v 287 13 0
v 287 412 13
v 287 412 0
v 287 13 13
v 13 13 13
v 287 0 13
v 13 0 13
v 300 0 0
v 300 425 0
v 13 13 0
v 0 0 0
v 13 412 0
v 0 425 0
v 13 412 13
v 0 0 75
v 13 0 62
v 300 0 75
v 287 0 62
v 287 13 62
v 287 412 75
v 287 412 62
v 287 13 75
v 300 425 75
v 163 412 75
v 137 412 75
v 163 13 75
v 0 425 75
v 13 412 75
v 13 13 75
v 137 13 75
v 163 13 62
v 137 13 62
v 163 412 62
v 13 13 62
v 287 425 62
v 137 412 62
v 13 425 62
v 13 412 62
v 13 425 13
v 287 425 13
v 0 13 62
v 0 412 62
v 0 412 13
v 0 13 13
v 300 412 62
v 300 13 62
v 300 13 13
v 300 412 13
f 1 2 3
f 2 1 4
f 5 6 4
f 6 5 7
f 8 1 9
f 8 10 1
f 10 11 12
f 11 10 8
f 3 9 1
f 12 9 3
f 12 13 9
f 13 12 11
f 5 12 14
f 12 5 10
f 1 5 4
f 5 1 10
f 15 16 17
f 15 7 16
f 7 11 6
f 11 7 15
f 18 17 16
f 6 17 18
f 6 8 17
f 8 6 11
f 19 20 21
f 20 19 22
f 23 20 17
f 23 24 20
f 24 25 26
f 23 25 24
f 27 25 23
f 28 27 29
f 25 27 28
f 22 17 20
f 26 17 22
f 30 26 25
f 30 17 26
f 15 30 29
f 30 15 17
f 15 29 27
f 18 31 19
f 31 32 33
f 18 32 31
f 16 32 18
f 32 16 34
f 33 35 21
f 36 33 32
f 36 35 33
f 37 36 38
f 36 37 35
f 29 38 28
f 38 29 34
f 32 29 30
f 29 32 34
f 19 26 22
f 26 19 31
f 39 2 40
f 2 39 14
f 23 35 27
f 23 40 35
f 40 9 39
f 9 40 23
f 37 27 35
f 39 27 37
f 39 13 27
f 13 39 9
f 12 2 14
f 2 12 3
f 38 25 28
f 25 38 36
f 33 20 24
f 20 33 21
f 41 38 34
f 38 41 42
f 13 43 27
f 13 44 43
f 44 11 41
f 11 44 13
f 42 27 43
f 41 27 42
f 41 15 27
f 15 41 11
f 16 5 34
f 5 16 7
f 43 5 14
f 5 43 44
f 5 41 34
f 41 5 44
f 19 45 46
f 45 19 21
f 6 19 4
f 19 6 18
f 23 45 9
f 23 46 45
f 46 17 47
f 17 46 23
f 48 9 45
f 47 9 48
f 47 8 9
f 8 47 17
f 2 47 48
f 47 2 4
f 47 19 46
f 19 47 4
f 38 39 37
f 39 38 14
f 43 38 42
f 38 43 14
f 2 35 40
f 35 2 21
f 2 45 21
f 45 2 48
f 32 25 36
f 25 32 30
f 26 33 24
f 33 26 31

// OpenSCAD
// file: material.scad
module tube(size, length)
{
	cube([length, size, size]);
}

module angle(size, thickness, length)
{
	s = size;
	t = thickness;
	l = length;

	union()
	{
		cube([s, t, l]);
		cube([t, s, l]);
	}
}

angle(18, 3, 300);
// main file
use<material.scad>

module base(tubesize, d)
{
	width = d[0];
	length = d[1];
	height = d[2];

	translate([tubesize,0,0]) rotate([0,0,90]) union()
	{
		tube(tubesize, length);
		translate([0,0,height-tubesize])
			tube(tubesize, length);
		translate([0,-(width-tubesize),0])
			tube(tubesize, length);
		translate([0,-(width-tubesize),height-tubesize])
			tube(tubesize, length);

		rotate([0,0,270]) union() color([255,0,0])
		{
			tube(tubesize, width-(tubesize*2));
			translate([0,0,height-tubesize])
				tube(tubesize, width-(tubesize*2));
			translate([0,length-tubesize,0])
				tube(tubesize, width-(tubesize*2));
			translate([0,length-tubesize,height-tubesize])
				tube(tubesize, width-(tubesize*2));
		}

		rotate([0,270,270]) union() color([0,0,255])
		{
			translate([tubesize,0,0])
				tube(tubesize, height-(tubesize*2));
			translate([tubesize,0,-(width-tubesize)])
				tube(tubesize, height-(tubesize*2));
			translate([tubesize,length-tubesize,0])
				tube(tubesize, height-(tubesize*2));
			translate([tubesize,length-tubesize,-(width-tubesize)])
				tube(tubesize, height-(tubesize*2));
		}

		translate([tubesize,-width/2,height-tubesize])
			cube([length-(tubesize*2), tubesize * 2, tubesize]);
	}
}

base(tubesize=13, d=[300,425,75]);
